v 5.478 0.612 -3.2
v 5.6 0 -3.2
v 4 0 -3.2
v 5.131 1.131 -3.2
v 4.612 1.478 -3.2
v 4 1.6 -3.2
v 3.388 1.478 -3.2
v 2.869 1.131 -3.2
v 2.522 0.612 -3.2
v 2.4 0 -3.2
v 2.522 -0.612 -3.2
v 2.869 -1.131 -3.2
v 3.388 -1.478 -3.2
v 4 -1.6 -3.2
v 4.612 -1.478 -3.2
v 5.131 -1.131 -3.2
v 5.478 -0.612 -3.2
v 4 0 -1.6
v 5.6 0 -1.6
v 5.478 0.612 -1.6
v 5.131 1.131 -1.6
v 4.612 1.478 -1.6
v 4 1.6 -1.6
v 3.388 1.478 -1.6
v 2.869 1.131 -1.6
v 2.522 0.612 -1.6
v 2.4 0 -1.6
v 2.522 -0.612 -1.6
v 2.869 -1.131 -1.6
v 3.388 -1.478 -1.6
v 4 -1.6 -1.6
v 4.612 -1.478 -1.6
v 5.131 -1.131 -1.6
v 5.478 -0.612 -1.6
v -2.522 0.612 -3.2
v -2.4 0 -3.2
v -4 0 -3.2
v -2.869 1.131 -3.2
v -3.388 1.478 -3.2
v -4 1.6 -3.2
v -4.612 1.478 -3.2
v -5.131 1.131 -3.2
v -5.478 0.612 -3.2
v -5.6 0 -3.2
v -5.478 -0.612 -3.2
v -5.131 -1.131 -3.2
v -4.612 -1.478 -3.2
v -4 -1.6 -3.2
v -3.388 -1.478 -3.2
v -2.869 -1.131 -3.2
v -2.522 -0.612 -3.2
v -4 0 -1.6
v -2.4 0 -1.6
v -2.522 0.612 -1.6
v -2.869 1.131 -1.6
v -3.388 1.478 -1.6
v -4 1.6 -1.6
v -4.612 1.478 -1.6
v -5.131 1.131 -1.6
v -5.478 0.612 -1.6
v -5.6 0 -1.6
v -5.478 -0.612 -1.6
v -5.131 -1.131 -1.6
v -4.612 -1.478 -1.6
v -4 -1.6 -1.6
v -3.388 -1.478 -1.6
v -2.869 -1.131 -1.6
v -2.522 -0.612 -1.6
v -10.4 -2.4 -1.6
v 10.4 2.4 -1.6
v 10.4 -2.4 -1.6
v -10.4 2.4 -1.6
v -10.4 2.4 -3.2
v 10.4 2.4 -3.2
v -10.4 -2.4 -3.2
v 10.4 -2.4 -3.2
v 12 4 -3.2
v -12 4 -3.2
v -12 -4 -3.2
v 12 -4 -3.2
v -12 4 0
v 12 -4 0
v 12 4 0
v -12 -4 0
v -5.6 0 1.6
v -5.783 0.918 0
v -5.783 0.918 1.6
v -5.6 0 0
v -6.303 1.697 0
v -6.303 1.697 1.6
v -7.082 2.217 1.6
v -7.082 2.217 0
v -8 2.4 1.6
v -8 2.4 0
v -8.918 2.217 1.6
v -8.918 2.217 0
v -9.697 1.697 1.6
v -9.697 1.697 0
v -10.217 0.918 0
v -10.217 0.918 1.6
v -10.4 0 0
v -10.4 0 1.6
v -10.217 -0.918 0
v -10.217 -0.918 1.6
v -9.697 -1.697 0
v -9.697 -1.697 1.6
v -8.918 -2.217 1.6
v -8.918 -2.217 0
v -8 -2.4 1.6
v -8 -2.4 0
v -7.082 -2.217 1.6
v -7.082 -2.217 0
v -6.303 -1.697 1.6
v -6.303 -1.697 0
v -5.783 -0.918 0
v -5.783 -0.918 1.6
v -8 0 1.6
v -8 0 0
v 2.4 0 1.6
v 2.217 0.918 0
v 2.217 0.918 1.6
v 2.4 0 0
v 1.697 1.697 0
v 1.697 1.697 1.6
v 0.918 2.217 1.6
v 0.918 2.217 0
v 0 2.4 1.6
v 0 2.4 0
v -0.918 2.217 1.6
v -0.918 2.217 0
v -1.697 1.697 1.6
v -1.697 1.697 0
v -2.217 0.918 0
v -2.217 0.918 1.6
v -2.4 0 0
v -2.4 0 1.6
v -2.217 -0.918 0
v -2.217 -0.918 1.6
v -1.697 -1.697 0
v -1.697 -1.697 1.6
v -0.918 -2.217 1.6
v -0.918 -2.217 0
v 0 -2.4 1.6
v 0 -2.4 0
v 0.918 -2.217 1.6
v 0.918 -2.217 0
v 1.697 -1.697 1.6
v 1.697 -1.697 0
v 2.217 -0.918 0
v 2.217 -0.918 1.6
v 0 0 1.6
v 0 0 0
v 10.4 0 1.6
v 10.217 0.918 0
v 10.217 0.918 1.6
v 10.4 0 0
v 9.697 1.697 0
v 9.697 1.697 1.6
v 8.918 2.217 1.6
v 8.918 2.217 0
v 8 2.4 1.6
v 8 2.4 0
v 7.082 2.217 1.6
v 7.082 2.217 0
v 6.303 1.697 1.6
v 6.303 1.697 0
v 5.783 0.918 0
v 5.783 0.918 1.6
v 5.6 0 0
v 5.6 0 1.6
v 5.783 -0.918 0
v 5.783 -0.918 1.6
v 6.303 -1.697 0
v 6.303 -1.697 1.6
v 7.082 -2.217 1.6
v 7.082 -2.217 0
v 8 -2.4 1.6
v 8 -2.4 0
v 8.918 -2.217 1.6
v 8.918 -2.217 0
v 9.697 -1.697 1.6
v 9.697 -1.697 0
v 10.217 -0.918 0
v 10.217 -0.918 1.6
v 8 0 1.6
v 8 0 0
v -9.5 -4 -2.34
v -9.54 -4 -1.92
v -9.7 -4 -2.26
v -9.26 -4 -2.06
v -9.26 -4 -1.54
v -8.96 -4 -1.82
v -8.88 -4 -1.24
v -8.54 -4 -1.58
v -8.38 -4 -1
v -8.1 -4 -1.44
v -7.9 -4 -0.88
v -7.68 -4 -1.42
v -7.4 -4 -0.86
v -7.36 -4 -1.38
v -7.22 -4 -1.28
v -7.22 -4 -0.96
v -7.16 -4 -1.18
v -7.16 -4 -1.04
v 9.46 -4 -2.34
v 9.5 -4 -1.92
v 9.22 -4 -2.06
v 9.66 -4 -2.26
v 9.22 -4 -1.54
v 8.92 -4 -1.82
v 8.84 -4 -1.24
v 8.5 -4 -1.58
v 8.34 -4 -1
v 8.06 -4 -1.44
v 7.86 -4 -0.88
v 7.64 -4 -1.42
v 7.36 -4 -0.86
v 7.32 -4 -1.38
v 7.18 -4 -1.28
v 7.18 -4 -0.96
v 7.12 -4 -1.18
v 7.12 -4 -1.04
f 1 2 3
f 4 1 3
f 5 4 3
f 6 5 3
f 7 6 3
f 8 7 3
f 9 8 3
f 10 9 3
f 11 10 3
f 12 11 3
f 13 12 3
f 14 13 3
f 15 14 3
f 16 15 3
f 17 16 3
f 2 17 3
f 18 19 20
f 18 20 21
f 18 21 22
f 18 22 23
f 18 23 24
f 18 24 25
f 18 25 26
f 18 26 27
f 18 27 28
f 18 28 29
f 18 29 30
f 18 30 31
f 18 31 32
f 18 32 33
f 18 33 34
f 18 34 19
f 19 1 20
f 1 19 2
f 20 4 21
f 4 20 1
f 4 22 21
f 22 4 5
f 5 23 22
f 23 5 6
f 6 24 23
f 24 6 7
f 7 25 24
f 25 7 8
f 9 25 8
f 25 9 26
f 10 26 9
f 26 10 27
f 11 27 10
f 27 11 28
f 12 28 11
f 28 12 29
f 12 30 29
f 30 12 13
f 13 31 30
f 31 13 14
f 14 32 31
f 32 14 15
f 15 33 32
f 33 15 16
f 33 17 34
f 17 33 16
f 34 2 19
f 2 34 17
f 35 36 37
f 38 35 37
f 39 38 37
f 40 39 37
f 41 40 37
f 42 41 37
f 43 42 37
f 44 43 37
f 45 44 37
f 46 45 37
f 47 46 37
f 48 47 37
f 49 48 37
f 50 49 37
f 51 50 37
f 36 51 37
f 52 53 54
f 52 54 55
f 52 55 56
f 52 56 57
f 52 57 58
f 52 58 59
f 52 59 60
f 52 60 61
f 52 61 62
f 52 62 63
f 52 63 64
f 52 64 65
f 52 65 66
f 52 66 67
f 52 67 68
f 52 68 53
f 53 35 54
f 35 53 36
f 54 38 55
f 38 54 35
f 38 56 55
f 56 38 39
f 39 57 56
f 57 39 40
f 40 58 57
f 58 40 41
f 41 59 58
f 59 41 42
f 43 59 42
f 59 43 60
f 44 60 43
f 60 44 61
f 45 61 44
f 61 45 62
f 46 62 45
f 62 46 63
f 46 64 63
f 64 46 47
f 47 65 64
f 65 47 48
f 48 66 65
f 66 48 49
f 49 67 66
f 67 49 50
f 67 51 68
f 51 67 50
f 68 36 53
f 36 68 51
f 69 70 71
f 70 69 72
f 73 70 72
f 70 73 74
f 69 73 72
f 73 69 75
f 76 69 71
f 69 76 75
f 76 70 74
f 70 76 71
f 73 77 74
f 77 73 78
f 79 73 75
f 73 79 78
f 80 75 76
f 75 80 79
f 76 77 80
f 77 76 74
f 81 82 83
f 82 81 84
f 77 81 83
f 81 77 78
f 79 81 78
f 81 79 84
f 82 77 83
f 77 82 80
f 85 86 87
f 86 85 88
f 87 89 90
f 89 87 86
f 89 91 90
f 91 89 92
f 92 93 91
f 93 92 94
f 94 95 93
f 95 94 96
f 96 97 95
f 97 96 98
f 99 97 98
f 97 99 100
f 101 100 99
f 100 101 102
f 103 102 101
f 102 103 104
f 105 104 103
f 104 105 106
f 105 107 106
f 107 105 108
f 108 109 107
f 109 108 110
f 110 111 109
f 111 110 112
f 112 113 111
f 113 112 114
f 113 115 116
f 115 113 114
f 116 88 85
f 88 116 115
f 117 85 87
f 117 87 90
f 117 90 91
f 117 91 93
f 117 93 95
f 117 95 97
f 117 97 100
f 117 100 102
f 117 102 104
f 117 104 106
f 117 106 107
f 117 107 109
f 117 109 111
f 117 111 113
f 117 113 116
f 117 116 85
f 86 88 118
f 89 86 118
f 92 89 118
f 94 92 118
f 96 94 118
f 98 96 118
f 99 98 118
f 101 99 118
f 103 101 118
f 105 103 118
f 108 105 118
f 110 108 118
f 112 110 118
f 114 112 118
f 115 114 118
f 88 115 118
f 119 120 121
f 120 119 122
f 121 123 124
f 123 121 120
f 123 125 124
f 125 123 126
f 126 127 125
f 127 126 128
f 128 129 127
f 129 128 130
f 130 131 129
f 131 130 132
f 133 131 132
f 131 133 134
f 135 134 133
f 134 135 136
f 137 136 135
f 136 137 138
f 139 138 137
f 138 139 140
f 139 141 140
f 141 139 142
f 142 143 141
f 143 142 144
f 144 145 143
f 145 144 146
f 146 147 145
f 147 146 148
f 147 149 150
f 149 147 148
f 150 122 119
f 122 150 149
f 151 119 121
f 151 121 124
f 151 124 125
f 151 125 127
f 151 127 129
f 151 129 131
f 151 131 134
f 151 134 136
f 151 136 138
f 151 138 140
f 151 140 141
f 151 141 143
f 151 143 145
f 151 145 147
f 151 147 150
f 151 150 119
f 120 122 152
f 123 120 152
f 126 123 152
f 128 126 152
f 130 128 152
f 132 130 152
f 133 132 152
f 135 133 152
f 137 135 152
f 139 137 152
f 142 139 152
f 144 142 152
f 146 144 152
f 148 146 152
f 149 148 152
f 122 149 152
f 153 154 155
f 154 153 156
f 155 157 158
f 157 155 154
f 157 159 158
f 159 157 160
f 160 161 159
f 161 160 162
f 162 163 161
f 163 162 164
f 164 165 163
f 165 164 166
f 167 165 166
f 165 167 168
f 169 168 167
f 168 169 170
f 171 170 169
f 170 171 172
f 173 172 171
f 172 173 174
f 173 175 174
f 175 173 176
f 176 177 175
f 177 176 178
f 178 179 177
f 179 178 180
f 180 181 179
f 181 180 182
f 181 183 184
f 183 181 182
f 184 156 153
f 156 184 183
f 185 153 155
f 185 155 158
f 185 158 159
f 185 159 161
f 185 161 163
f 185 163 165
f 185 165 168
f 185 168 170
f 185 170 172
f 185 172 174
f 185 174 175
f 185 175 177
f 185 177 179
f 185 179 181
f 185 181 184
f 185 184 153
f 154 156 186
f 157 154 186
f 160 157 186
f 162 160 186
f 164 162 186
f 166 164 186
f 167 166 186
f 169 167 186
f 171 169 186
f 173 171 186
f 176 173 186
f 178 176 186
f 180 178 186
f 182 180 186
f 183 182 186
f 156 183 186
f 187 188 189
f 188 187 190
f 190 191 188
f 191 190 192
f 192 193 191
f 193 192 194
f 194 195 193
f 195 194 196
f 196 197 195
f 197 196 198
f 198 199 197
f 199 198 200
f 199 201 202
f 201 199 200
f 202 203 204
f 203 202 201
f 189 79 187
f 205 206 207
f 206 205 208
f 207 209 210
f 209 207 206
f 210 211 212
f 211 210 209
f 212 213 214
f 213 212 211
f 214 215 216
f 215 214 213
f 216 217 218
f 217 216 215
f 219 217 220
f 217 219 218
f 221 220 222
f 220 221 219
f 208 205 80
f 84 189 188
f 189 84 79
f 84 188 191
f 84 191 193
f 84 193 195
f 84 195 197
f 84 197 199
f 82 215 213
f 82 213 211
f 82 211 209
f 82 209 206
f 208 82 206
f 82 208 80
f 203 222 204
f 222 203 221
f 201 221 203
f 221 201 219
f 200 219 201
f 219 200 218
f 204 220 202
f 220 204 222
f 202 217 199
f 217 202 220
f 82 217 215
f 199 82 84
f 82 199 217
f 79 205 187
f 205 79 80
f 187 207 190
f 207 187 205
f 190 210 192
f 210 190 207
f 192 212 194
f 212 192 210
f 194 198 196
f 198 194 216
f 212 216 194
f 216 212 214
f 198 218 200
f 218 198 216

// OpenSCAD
// file: ../p/stud.scad
use <../lib.scad>
use <4-4cyli.scad>
use <4-4disc.scad>
use <4-4edge.scad>
function ldraw_lib__stud() = [
// 0 Stud
// 0 Name: stud.dat
// 0 Author: James Jessiman
// 0 !LDRAW_ORG Primitive UPDATE 2012-01
// 0 !LICENSE Licensed under CC BY 4.0 : see CAreadme.txt
// 
// 0 BFC CERTIFY CCW
  [0,"BFC","CERTIFY"],
  [0,"BFC","CCW"],
// 
// 0 !HISTORY 2002-04-04 [sbliss] Modified for BFC compliance
// 0 !HISTORY 2002-04-25 [PTadmin] Official Update 2002-02
// 0 !HISTORY 2007-06-24 [PTadmin] Header formatted for Contributor Agreement
// 0 !HISTORY 2008-07-01 [PTadmin] Official Update 2008-01
// 0 !HISTORY 2012-02-16 [Philo] Changed to CCW
// 0 !HISTORY 2012-03-30 [PTadmin] Official Update 2012-01
// 
// 
// 1 16 0 0 0 6 0 0 0 1 0 0 0 6 4-4edge.dat
  [1,16,0,0,0,6,0,0,0,1,0,0,0,6, ldraw_lib__4_4edge()],
// 1 16 0 -4 0 6 0 0 0 1 0 0 0 6 4-4edge.dat
  [1,16,0,-4,0,6,0,0,0,1,0,0,0,6, ldraw_lib__4_4edge()],
// 1 16 0 0 0 6 0 0 0 -4 0 0 0 6 4-4cyli.dat
  [1,16,0,0,0,6,0,0,0,-4,0,0,0,6, ldraw_lib__4_4cyli()],
// 1 16 0 -4 0 6 0 0 0 1 0 0 0 6 4-4disc.dat
  [1,16,0,-4,0,6,0,0,0,1,0,0,0,6, ldraw_lib__4_4disc()],
  [-1,16,0,0,0,6,0,0,0,-1,0,0,0,6, ldraw_lib__4_4disc()],
];
module ldraw_lib__stud(step=0, col=false, unit=2/5, alt=false, line=0.2, solid=!$preview)
    makepoly(ldraw_lib__stud(), step=step, col=col, unit=unit, alt=alt, line=line, solid=solid);
ldraw_lib__stud(line=0.2);
// file: ../p/4-4edge.scad
use <../lib.scad>
function ldraw_lib__4_4edge() = [
// 0 Circle 1.0
// 0 Name: 4-4edge.dat
// 0 Author: James Jessiman
// 0 !LDRAW_ORG Primitive UPDATE 2017-01
// 0 !LICENSE Licensed under CC BY 2.0 and CC BY 4.0 : see CAreadme.txt
// 
// 0 BFC CERTIFY CCW
  [0,"BFC","CERTIFY"],
  [0,"BFC","CCW"],
// 
// 0 !HISTORY 1998-12-15 [PTadmin] Official Update 1998-10
// 0 !HISTORY 2005-12-28 [PTadmin] Official Update 2005-01
// 0 !HISTORY 2007-06-24 [PTadmin] Header formatted for Contributor Agreement
// 0 !HISTORY 2008-07-01 [PTadmin] Official Update 2008-01
// 0 !HISTORY 2017-01-15 [Steffen] BFCed
// 0 !HISTORY 2017-12-30 [PTadmin] Official Update 2017-01
// 
// 
// 2 24 1 0 0 0.9239 0 0.3827
  [2,24,1,0,0,0.9239,0,0.3827],
// 2 24 0.9239 0 0.3827 0.7071 0 0.7071
  [2,24,0.9239,0,0.3827,0.7071,0,0.7071],
// 2 24 0.7071 0 0.7071 0.3827 0 0.9239
  [2,24,0.7071,0,0.7071,0.3827,0,0.9239],
// 2 24 0.3827 0 0.9239 0 0 1
  [2,24,0.3827,0,0.9239,0,0,1],
// 2 24 0 0 1 -0.3827 0 0.9239
  [2,24,0,0,1,-0.3827,0,0.9239],
// 2 24 -0.3827 0 0.9239 -0.7071 0 0.7071
  [2,24,-0.3827,0,0.9239,-0.7071,0,0.7071],
// 2 24 -0.7071 0 0.7071 -0.9239 0 0.3827
  [2,24,-0.7071,0,0.7071,-0.9239,0,0.3827],
// 2 24 -0.9239 0 0.3827 -1 0 -0
  [2,24,-0.9239,0,0.3827,-1,0,-0],
// 2 24 -1 0 -0 -0.9239 0 -0.3827
  [2,24,-1,0,-0,-0.9239,0,-0.3827],
// 2 24 -0.9239 0 -0.3827 -0.7071 0 -0.7071
  [2,24,-0.9239,0,-0.3827,-0.7071,0,-0.7071],
// 2 24 -0.7071 0 -0.7071 -0.3827 0 -0.9239
  [2,24,-0.7071,0,-0.7071,-0.3827,0,-0.9239],
// 2 24 -0.3827 0 -0.9239 0 0 -1
  [2,24,-0.3827,0,-0.9239,0,0,-1],
// 2 24 0 0 -1 0.3827 0 -0.9239
  [2,24,0,0,-1,0.3827,0,-0.9239],
// 2 24 0.3827 0 -0.9239 0.7071 0 -0.7071
  [2,24,0.3827,0,-0.9239,0.7071,0,-0.7071],
// 2 24 0.7071 0 -0.7071 0.9239 0 -0.3827
  [2,24,0.7071,0,-0.7071,0.9239,0,-0.3827],
// 2 24 0.9239 0 -0.3827 1 0 0
  [2,24,0.9239,0,-0.3827,1,0,0],
];
module ldraw_lib__4_4edge(step=0, col=false, unit=2/5, alt=false, line=0.2, solid=!$preview)
    makepoly(ldraw_lib__4_4edge(), step=step, col=col, unit=unit, alt=alt, line=line, solid=solid);
ldraw_lib__4_4edge(line=0.2);
// file: ../p/4-4disc.scad
use <../lib.scad>
function ldraw_lib__4_4disc() = [
// 0 Disc 1.0
// 0 Name: 4-4disc.dat
// 0 Author: James Jessiman
// 0 !LDRAW_ORG Primitive UPDATE 2002-02
// 0 !LICENSE Licensed under CC BY 2.0 and CC BY 4.0 : see CAreadme.txt
// 
// 0 BFC CERTIFY CCW
  [0,"BFC","CERTIFY"],
  [0,"BFC","CCW"],
// 
// 0 !HISTORY 1998-12-15 [PTadmin] Official Update 1998-10
// 0 !HISTORY 2002-03-23 [sbliss] Added BFC statement
// 0 !HISTORY 2002-04-25 [PTadmin] Official Update 2002-02
// 0 !HISTORY 2007-06-24 [PTadmin] Header formatted for Contributor Agreement
// 0 !HISTORY 2008-07-01 [PTadmin] Official Update 2008-01
// 
// 
// 3 16 0 0 0 1 0 0 0.9239 0 0.3827
  [3,16,0,0,0,1,0,0,0.9239,0,0.3827],
// 3 16 0 0 0 0.9239 0 0.3827 0.7071 0 0.7071
  [3,16,0,0,0,0.9239,0,0.3827,0.7071,0,0.7071],
// 3 16 0 0 0 0.7071 0 0.7071 0.3827 0 0.9239
  [3,16,0,0,0,0.7071,0,0.7071,0.3827,0,0.9239],
// 3 16 0 0 0 0.3827 0 0.9239 0 0 1
  [3,16,0,0,0,0.3827,0,0.9239,0,0,1],
// 3 16 0 0 0 0 0 1 -0.3827 0 0.9239
  [3,16,0,0,0,0,0,1,-0.3827,0,0.9239],
// 3 16 0 0 0 -0.3827 0 0.9239 -0.7071 0 0.7071
  [3,16,0,0,0,-0.3827,0,0.9239,-0.7071,0,0.7071],
// 3 16 0 0 0 -0.7071 0 0.7071 -0.9239 0 0.3827
  [3,16,0,0,0,-0.7071,0,0.7071,-0.9239,0,0.3827],
// 3 16 0 0 0 -0.9239 0 0.3827 -1 0 -0
  [3,16,0,0,0,-0.9239,0,0.3827,-1,0,-0],
// 3 16 0 0 0 -1 0 -0 -0.9239 0 -0.3827
  [3,16,0,0,0,-1,0,-0,-0.9239,0,-0.3827],
// 3 16 0 0 0 -0.9239 0 -0.3827 -0.7071 0 -0.7071
  [3,16,0,0,0,-0.9239,0,-0.3827,-0.7071,0,-0.7071],
// 3 16 0 0 0 -0.7071 0 -0.7071 -0.3827 0 -0.9239
  [3,16,0,0,0,-0.7071,0,-0.7071,-0.3827,0,-0.9239],
// 3 16 0 0 0 -0.3827 0 -0.9239 0 0 -1
  [3,16,0,0,0,-0.3827,0,-0.9239,0,0,-1],
// 3 16 0 0 0 0 0 -1 0.3827 0 -0.9239
  [3,16,0,0,0,0,0,-1,0.3827,0,-0.9239],
// 3 16 0 0 0 0.3827 0 -0.9239 0.7071 0 -0.7071
  [3,16,0,0,0,0.3827,0,-0.9239,0.7071,0,-0.7071],
// 3 16 0 0 0 0.7071 0 -0.7071 0.9239 0 -0.3827
  [3,16,0,0,0,0.7071,0,-0.7071,0.9239,0,-0.3827],
// 3 16 0 0 0 0.9239 0 -0.3827 1 0 0
  [3,16,0,0,0,0.9239,0,-0.3827,1,0,0],
// 0
];
module ldraw_lib__4_4disc(step=0, col=false, unit=2/5, alt=false, line=0.2, solid=!$preview)
    makepoly(ldraw_lib__4_4disc(), step=step, col=col, unit=unit, alt=alt, line=line, solid=solid);
ldraw_lib__4_4disc(line=0.2);
// file: ../p/4-4cyli.scad
use <../lib.scad>
$fa=1; $fs=0.2;
function ldraw_lib__4_4cyli(realsolid=false) = [
// 0 Cylinder 1.0
// 0 Name: 4-4cyli.dat
// 0 Author: James Jessiman
// 0 !LDRAW_ORG Primitive UPDATE 2005-01
// 0 !LICENSE Licensed under CC BY 2.0 and CC BY 4.0 : see CAreadme.txt
// 
// 0 BFC CERTIFY CCW
  [0,"BFC","CERTIFY"],
  [0,"BFC","CCW"],
// 
// 0 !HISTORY 1998-12-15 [PTadmin] Official Update 1998-10
// 0 !HISTORY 2002-03-23 [sbliss] Added BFC statement; merged headers from files in distributions LDraw 0.27 and Complete.
// 0 !HISTORY 2002-04-25 [PTadmin] Official Update 2002-02
// 0 !HISTORY 2004-12-14 [guyvivan] BFC CCW
// 0 !HISTORY 2005-12-28 [PTadmin] Official Update 2005-01
// 0 !HISTORY 2007-06-24 [PTadmin] Header formatted for Contributor Agreement
// 0 !HISTORY 2008-07-01 [PTadmin] Official Update 2008-01
// 
// 
// 4 16 1 1 0 0.9239 1 0.3827 0.9239 0 0.3827 1 0 0
  [4,16,1,1,0,0.9239,1,0.3827,0.9239,0,0.3827,1,0,0],
// 5 24 1 0 0 1 1 0 0.9239 0 0.3827 0.9239 0 -0.3827
  [5,24,1,0,0,1,1,0,0.9239,0,0.3827,0.9239,0,-0.3827],
// 4 16 0.9239 1 0.3827 0.7071 1 0.7071 0.7071 0 0.7071 0.9239 0 0.3827
  [4,16,0.9239,1,0.3827,0.7071,1,0.7071,0.7071,0,0.7071,0.9239,0,0.3827],
// 5 24 0.9239 0 0.3827 0.9239 1 0.3827 0.7071 0 0.7071 1 0 0
  [5,24,0.9239,0,0.3827,0.9239,1,0.3827,0.7071,0,0.7071,1,0,0],
// 4 16 0.7071 1 0.7071 0.3827 1 0.9239 0.3827 0 0.9239 0.7071 0 0.7071
  [4,16,0.7071,1,0.7071,0.3827,1,0.9239,0.3827,0,0.9239,0.7071,0,0.7071],
// 5 24 0.7071 0 0.7071 0.7071 1 0.7071 0.3827 0 0.9239 0.9239 0 0.3827
  [5,24,0.7071,0,0.7071,0.7071,1,0.7071,0.3827,0,0.9239,0.9239,0,0.3827],
// 4 16 0.3827 1 0.9239 0 1 1 0 0 1 0.3827 0 0.9239
  [4,16,0.3827,1,0.9239,0,1,1,0,0,1,0.3827,0,0.9239],
// 5 24 0.3827 0 0.9239 0.3827 1 0.9239 0 0 1 0.7071 0 0.7071
  [5,24,0.3827,0,0.9239,0.3827,1,0.9239,0,0,1,0.7071,0,0.7071],
// 4 16 0 1 1 -0.3827 1 0.9239 -0.3827 0 0.9239 0 0 1
  [4,16,0,1,1,-0.3827,1,0.9239,-0.3827,0,0.9239,0,0,1],
// 5 24 0 0 1 0 1 1 -0.3827 0 0.9239 0.3827 0 0.9239
  [5,24,0,0,1,0,1,1,-0.3827,0,0.9239,0.3827,0,0.9239],
// 4 16 -0.3827 1 0.9239 -0.7071 1 0.7071 -0.7071 0 0.7071 -0.3827 0 0.9239
  [4,16,-0.3827,1,0.9239,-0.7071,1,0.7071,-0.7071,0,0.7071,-0.3827,0,0.9239],
// 5 24 -0.3827 0 0.9239 -0.3827 1 0.9239 -0.7071 0 0.7071 0 0 1
  [5,24,-0.3827,0,0.9239,-0.3827,1,0.9239,-0.7071,0,0.7071,0,0,1],
// 4 16 -0.7071 1 0.7071 -0.9239 1 0.3827 -0.9239 0 0.3827 -0.7071 0 0.7071
  [4,16,-0.7071,1,0.7071,-0.9239,1,0.3827,-0.9239,0,0.3827,-0.7071,0,0.7071],
// 5 24 -0.7071 0 0.7071 -0.7071 1 0.7071 -0.9239 0 0.3827 -0.3827 0 0.9239
  [5,24,-0.7071,0,0.7071,-0.7071,1,0.7071,-0.9239,0,0.3827,-0.3827,0,0.9239],
// 4 16 -0.9239 1 0.3827 -1 1 0 -1 0 0 -0.9239 0 0.3827
  [4,16,-0.9239,1,0.3827,-1,1,0,-1,0,0,-0.9239,0,0.3827],
// 5 24 -0.9239 0 0.3827 -0.9239 1 0.3827 -1 0 0 -0.7071 0 0.7071
  [5,24,-0.9239,0,0.3827,-0.9239,1,0.3827,-1,0,0,-0.7071,0,0.7071],
// 4 16 -1 1 0 -0.9239 1 -0.3827 -0.9239 0 -0.3827 -1 0 0
  [4,16,-1,1,0,-0.9239,1,-0.3827,-0.9239,0,-0.3827,-1,0,0],
// 5 24 -1 0 0 -1 1 0 -0.9239 0 -0.3827 -0.9239 0 0.3827
  [5,24,-1,0,0,-1,1,0,-0.9239,0,-0.3827,-0.9239,0,0.3827],
// 4 16 -0.9239 1 -0.3827 -0.7071 1 -0.7071 -0.7071 0 -0.7071 -0.9239 0 -0.3827
  [4,16,-0.9239,1,-0.3827,-0.7071,1,-0.7071,-0.7071,0,-0.7071,-0.9239,0,-0.3827],
// 5 24 -0.9239 0 -0.3827 -0.9239 1 -0.3827 -0.7071 0 -0.7071 -1 0 0
  [5,24,-0.9239,0,-0.3827,-0.9239,1,-0.3827,-0.7071,0,-0.7071,-1,0,0],
// 4 16 -0.7071 1 -0.7071 -0.3827 1 -0.9239 -0.3827 0 -0.9239 -0.7071 0 -0.7071
  [4,16,-0.7071,1,-0.7071,-0.3827,1,-0.9239,-0.3827,0,-0.9239,-0.7071,0,-0.7071],
// 5 24 -0.7071 0 -0.7071 -0.7071 1 -0.7071 -0.3827 0 -0.9239 -0.9239 0 -0.3827
  [5,24,-0.7071,0,-0.7071,-0.7071,1,-0.7071,-0.3827,0,-0.9239,-0.9239,0,-0.3827],
// 4 16 -0.3827 1 -0.9239 0 1 -1 0 0 -1 -0.3827 0 -0.9239
  [4,16,-0.3827,1,-0.9239,0,1,-1,0,0,-1,-0.3827,0,-0.9239],
// 5 24 -0.3827 0 -0.9239 -0.3827 1 -0.9239 0 0 -1 -0.7071 0 -0.7071
  [5,24,-0.3827,0,-0.9239,-0.3827,1,-0.9239,0,0,-1,-0.7071,0,-0.7071],
// 4 16 0 1 -1 0.3827 1 -0.9239 0.3827 0 -0.9239 0 0 -1
  [4,16,0,1,-1,0.3827,1,-0.9239,0.3827,0,-0.9239,0,0,-1],
// 5 24 0 0 -1 0 1 -1 0.3827 0 -0.9239 -0.3827 0 -0.9239
  [5,24,0,0,-1,0,1,-1,0.3827,0,-0.9239,-0.3827,0,-0.9239],
// 4 16 0.3827 1 -0.9239 0.7071 1 -0.7071 0.7071 0 -0.7071 0.3827 0 -0.9239
  [4,16,0.3827,1,-0.9239,0.7071,1,-0.7071,0.7071,0,-0.7071,0.3827,0,-0.9239],
// 5 24 0.3827 0 -0.9239 0.3827 1 -0.9239 0.7071 0 -0.7071 0 0 -1
  [5,24,0.3827,0,-0.9239,0.3827,1,-0.9239,0.7071,0,-0.7071,0,0,-1],
// 4 16 0.7071 1 -0.7071 0.9239 1 -0.3827 0.9239 0 -0.3827 0.7071 0 -0.7071
  [4,16,0.7071,1,-0.7071,0.9239,1,-0.3827,0.9239,0,-0.3827,0.7071,0,-0.7071],
// 5 24 0.7071 0 -0.7071 0.7071 1 -0.7071 0.9239 0 -0.3827 0.3827 0 -0.9239
  [5,24,0.7071,0,-0.7071,0.7071,1,-0.7071,0.9239,0,-0.3827,0.3827,0,-0.9239],
// 4 16 0.9239 1 -0.3827 1 1 0 1 0 0 0.9239 0 -0.3827
  [4,16,0.9239,1,-0.3827,1,1,0,1,0,0,0.9239,0,-0.3827],
// 5 24 0.9239 0 -0.3827 0.9239 1 -0.3827 1 0 0 0.7071 0 -0.7071
  [5,24,0.9239,0,-0.3827,0.9239,1,-0.3827,1,0,0,0.7071,0,-0.7071],
// 0
];
module ldraw_lib__4_4cyli(step=0, col=false, unit=2/5, alt=false, line=0.2, solid=!$preview)
    makepoly(ldraw_lib__4_4cyli(solid), step=step, col=col, unit=unit, alt=alt, line=line, solid=solid);
ldraw_lib__4_4cyli(line=0.2);
// file: ../p/stug-1x3.scad
use <../lib.scad>
use <stud.scad>
$fa=1; $fs=0.2;
function ldraw_lib__stug_1x3(realsolid=false) = [
// 0 Stud Group  1 x  3
// 0 Name: stug-1x3.dat
// 0 Author: Steffen [Steffen]
// 0 !LDRAW_ORG Primitive UPDATE 2012-01
// 0 !LICENSE Licensed under CC BY 2.0 and CC BY 4.0 : see CAreadme.txt
// 
// 0 BFC CERTIFY CCW
  [0,"BFC","CERTIFY"],
  [0,"BFC","CCW"],
// 
// 0 !HISTORY 2012-03-30 [PTadmin] Official Update 2012-01
// 
// 
// 1 16 -20 0 0 1 0 0 0 1 0 0 0 1 stud.dat
  [1,16,-20,0,0,1,0,0,0,1,0,0,0,1, ldraw_lib__stud(realsolid)],
// 1 16 0 0 0 1 0 0 0 1 0 0 0 1 stud.dat
  [1,16,0,0,0,1,0,0,0,1,0,0,0,1, ldraw_lib__stud(realsolid)],
// 1 16 20 0 0 1 0 0 0 1 0 0 0 1 stud.dat
  [1,16,20,0,0,1,0,0,0,1,0,0,0,1, ldraw_lib__stud(realsolid)],
];
module ldraw_lib__stug_1x3(step=0, col=false, unit=2/5, alt=false, line=0.2, solid=!$preview)
    makepoly(ldraw_lib__stug_1x3(solid), step=step, col=col, unit=unit, alt=alt, line=line, solid=solid);
ldraw_lib__stug_1x3(line=0.2);
// file: ../p/stud3.scad
use <../lib.scad>
use <4-4cyli.scad>
use <4-4disc.scad>
use <4-4edge.scad>
function ldraw_lib__stud3() = [
// 0 Stud Tube Solid
// 0 Name: stud3.dat
// 0 Author: James Jessiman
// 0 !LDRAW_ORG Primitive UPDATE 2012-01
// 0 !LICENSE Licensed under CC BY 4.0 : see CAreadme.txt
// 
// 0 BFC CERTIFY CCW
  [0,"BFC","CERTIFY"],
  [0,"BFC","CCW"],
// 
// 0 !HISTORY 2002-04-04 [sbliss] Modified for BFC compliance
// 0 !HISTORY 2002-04-25 [PTadmin] Official Update 2002-02
// 0 !HISTORY 2007-06-24 [PTadmin] Header formatted for Contributor Agreement
// 0 !HISTORY 2008-07-01 [PTadmin] Official Update 2008-01
// 0 !HISTORY 2012-02-16 [Philo] Changed to CCW
// 0 !HISTORY 2012-03-30 [PTadmin] Official Update 2012-01
// 
// 
// 1 16 0 -4 0 4 0 0 0 1 0 0 0 4 4-4edge.dat
  [1,16,0,-4,0,4,0,0,0,1,0,0,0,4, ldraw_lib__4_4edge()],
// 1 16 0 0 0 4 0 0 0 1 0 0 0 4 4-4edge.dat
  [1,16,0,0,0,4,0,0,0,1,0,0,0,4, ldraw_lib__4_4edge()],
// 1 16 0 -4 0 4 0 0 0 1 0 0 0 4 4-4disc.dat
  [1,16,0,-4,0,4,0,0,0,1,0,0,0,4, ldraw_lib__4_4disc()],
  [-1,16,0,0,0,4,0,0,0,-1,0,0,0,4, ldraw_lib__4_4disc()],
// 1 16 0 -4 0 4 0 0 0 4 0 0 0 4 4-4cyli.dat
  [1,16,0,-4,0,4,0,0,0,4,0,0,0,4, ldraw_lib__4_4cyli()],
];
module ldraw_lib__stud3(step=0, col=false, unit=2/5, alt=false, line=0.2, solid=!$preview)
    makepoly(ldraw_lib__stud3(), step=step, col=col, unit=unit, alt=alt, line=line, solid=solid);
ldraw_lib__stud3(line=0.2);
// file: ../p/box5.scad
use <../lib.scad>
function ldraw_lib__box5() = [
// 0 Box with 5 Faces and All Edges
// 0 Name: box5.dat
// 0 Author: James Jessiman
// 0 !LDRAW_ORG Primitive UPDATE 2012-01
// 0 !LICENSE Licensed under CC BY 2.0 and CC BY 4.0 : see CAreadme.txt
// 
// 0 BFC CERTIFY CCW
  [0,"BFC","CERTIFY"],
  [0,"BFC","CCW"],
// 
// 0 !HISTORY 2002-04-03 [sbliss] Modified for BFC compliance
// 0 !HISTORY 2002-04-25 [PTadmin] Official Update 2002-02
// 0 !HISTORY 2007-06-24 [PTadmin] Header formatted for Contributor Agreement
// 0 !HISTORY 2008-07-01 [PTadmin] Official Update 2008-01
// 0 !HISTORY 2012-02-16 [Philo] Changed to CCW
// 0 !HISTORY 2012-03-30 [PTadmin] Official Update 2012-01
// 
// 
// 2 24 1 1 1 -1 1 1
  [2,24,1,1,1,-1,1,1],
// 2 24 -1 1 1 -1 1 -1
  [2,24,-1,1,1,-1,1,-1],
// 2 24 -1 1 -1 1 1 -1
  [2,24,-1,1,-1,1,1,-1],
// 2 24 1 1 -1 1 1 1
  [2,24,1,1,-1,1,1,1],
// 2 24 1 0 1 -1 0 1
  [2,24,1,0,1,-1,0,1],
// 2 24 -1 0 1 -1 0 -1
  [2,24,-1,0,1,-1,0,-1],
// 2 24 -1 0 -1 1 0 -1
  [2,24,-1,0,-1,1,0,-1],
// 2 24 1 0 -1 1 0 1
  [2,24,1,0,-1,1,0,1],
// 2 24 1 0 1 1 1 1
  [2,24,1,0,1,1,1,1],
// 2 24 -1 0 1 -1 1 1
  [2,24,-1,0,1,-1,1,1],
// 2 24 1 0 -1 1 1 -1
  [2,24,1,0,-1,1,1,-1],
// 2 24 -1 0 -1 -1 1 -1
  [2,24,-1,0,-1,-1,1,-1],
// 4 16 -1 1 1 1 1 1 1 1 -1 -1 1 -1
  [4,16,-1,1,1,1,1,1,1,1,-1,-1,1,-1],
// 4 16 -1 1 1 -1 0 1 1 0 1 1 1 1
  [4,16,-1,1,1,-1,0,1,1,0,1,1,1,1],
// 4 16 -1 1 -1 -1 0 -1 -1 0 1 -1 1 1
  [4,16,-1,1,-1,-1,0,-1,-1,0,1,-1,1,1],
// 4 16 1 1 -1 1 0 -1 -1 0 -1 -1 1 -1
  [4,16,1,1,-1,1,0,-1,-1,0,-1,-1,1,-1],
// 4 16 1 1 1 1 0 1 1 0 -1 1 1 -1
  [4,16,1,1,1,1,0,1,1,0,-1,1,1,-1],
];
makepoly(ldraw_lib__box5(), line=0.2);
// file: ../p/box4t.scad
use <../lib.scad>
function ldraw_lib__box4t() = [
// 0 Box with 4 Adjacent Faces and All Edges
// 0 Name: box4t.dat
// 0 Author: Tore Eriksson [Tore_Eriksson]
// 0 !LDRAW_ORG Primitive UPDATE 2003-02
// 0 !LICENSE Licensed under CC BY 2.0 and CC BY 4.0 : see CAreadme.txt
// 
// 0 BFC CERTIFY CCW
  [0,"BFC","CERTIFY"],
  [0,"BFC","CCW"],
// 
// 0 !HISTORY 1997-09-29 [PTadmin] Official Update 1997-15
// 0 !HISTORY 2002-08-31 [izanette] Modified with WINDZ for BFC compliance
// 0 !HISTORY 2003-08-01 [PTadmin] Official Update 2003-02
// 0 !HISTORY 2007-06-24 [PTadmin] Header formatted for Contributor Agreement
// 0 !HISTORY 2008-07-01 [PTadmin] Official Update 2008-01
// 
// 
// 2 24 1 1 1 -1 1 1
  [2,24,1,1,1,-1,1,1],
// 2 24 -1 1 1 -1 1 -1
  [2,24,-1,1,1,-1,1,-1],
// 2 24 -1 1 -1 1 1 -1
  [2,24,-1,1,-1,1,1,-1],
// 2 24 1 1 -1 1 1 1
  [2,24,1,1,-1,1,1,1],
// 2 24 1 0 1 -1 0 1
  [2,24,1,0,1,-1,0,1],
// 2 24 -1 0 1 -1 0 -1
  [2,24,-1,0,1,-1,0,-1],
// 2 24 -1 0 -1 1 0 -1
  [2,24,-1,0,-1,1,0,-1],
// 2 24 1 0 -1 1 0 1
  [2,24,1,0,-1,1,0,1],
// 2 24 1 0 1 1 1 1
  [2,24,1,0,1,1,1,1],
// 2 24 -1 0 1 -1 1 1
  [2,24,-1,0,1,-1,1,1],
// 2 24 1 0 -1 1 1 -1
  [2,24,1,0,-1,1,1,-1],
// 2 24 -1 0 -1 -1 1 -1
  [2,24,-1,0,-1,-1,1,-1],
// 4 16 1 1 1 1 1 -1 -1 1 -1 -1 1 1
  [4,16,1,1,1,1,1,-1,-1,1,-1,-1,1,1],
// 4 16 1 1 1 -1 1 1 -1 0 1 1 0 1
  [4,16,1,1,1,-1,1,1,-1,0,1,1,0,1],
// 4 16 -1 1 1 -1 1 -1 -1 0 -1 -1 0 1
  [4,16,-1,1,1,-1,1,-1,-1,0,-1,-1,0,1],
// 0 4 16 -1 1 -1 -1 0 -1 1 0 -1 1 1 -1
// 4 16 1 1 -1 1 1 1 1 0 1 1 0 -1
  [4,16,1,1,-1,1,1,1,1,0,1,1,0,-1],
// 0
];
makepoly(ldraw_lib__box4t(), line=0.2);
// file: s/3623s01.scad
use <../../lib.scad>
use <../../p/box4t.scad>
use <../../p/box5.scad>
use <../../p/stud3.scad>
use <../../p/stug-1x3.scad>
function ldraw_lib__s__3623s01() = [
// 0 ~Plate  1 x  3 without Front Face
// 0 Name: s\3623s01.dat
// 0 Author: Massimo Maso [Sirio]
// 0 !LDRAW_ORG Subpart UPDATE 2017-01
// 0 !LICENSE Licensed under CC BY 2.0 and CC BY 4.0 : see CAreadme.txt
// 
// 0 BFC CERTIFY CCW
  [0,"BFC","CERTIFY"],
  [0,"BFC","CCW"],
// 
// 0 !HISTORY 2017-12-30 [PTadmin] Official Update 2017-01
// 
// 
// 1 16 10 4 0 1 0 0 0 -1 0 0 0 1 stud3.dat
  [1,16,10,4,0,1,0,0,0,-1,0,0,0,1, ldraw_lib__stud3()],
// 1 16 -10 4 0 1 0 0 0 -1 0 0 0 1 stud3.dat
  [1,16,-10,4,0,1,0,0,0,-1,0,0,0,1, ldraw_lib__stud3()],
// 0 BFC INVERTNEXT
  [0,"BFC","INVERTNEXT"],
// 1 16 0 8 0 26 0 0 0 -4 0 0 0 6 box5.dat
  [1,16,0,8,0,26,0,0,0,-4,0,0,0,6, ldraw_lib__box5()],
// 4 16 30 8 10 26 8 6 -26 8 6 -30 8 10
  [4,16,30,8,10,26,8,6,-26,8,6,-30,8,10],
// 4 16 -30 8 10 -26 8 6 -26 8 -6 -30 8 -10
  [4,16,-30,8,10,-26,8,6,-26,8,-6,-30,8,-10],
// 4 16 -30 8 -10 -26 8 -6 26 8 -6 30 8 -10
  [4,16,-30,8,-10,-26,8,-6,26,8,-6,30,8,-10],
// 4 16 30 8 -10 26 8 -6 26 8 6 30 8 10
  [4,16,30,8,-10,26,8,-6,26,8,6,30,8,10],
// 1 16 0 8 0 30 0 0 0 -8 0 0 0 10 box4t.dat
  [1,16,0,8,0,30,0,0,0,-8,0,0,0,10, ldraw_lib__box4t()],
// 1 16 0 0 0 1 0 0 0 1 0 0 0 1 stug-1x3.dat
  [1,16,0,0,0,1,0,0,0,1,0,0,0,1, ldraw_lib__stug_1x3()],
];
module ldraw_lib__s__3623s01(step=0, col=false, unit=2/5, alt=false, line=0.2, solid=!$preview)
    makepoly(ldraw_lib__s__3623s01(), step=step, col=col, unit=unit, alt=alt, line=line, solid=solid);
ldraw_lib__s__3623s01(line=0.2);
// main file
use <../lib.scad>
use <s/3623s01.scad>
function ldraw_lib__3623p02() = [
// 0 Plate  1 x  3 with Symmetric, High Set Black Eyebrows Pattern
// 0 Name: 3623p02.dat
// 0 Author: Evert-Jan Boer [ejboer]
// 0 !LDRAW_ORG Part UPDATE 2022-01
// 0 !LICENSE Licensed under CC BY 4.0 : see CAreadme.txt
// 
// 0 BFC CERTIFY CCW
  [0,"BFC","CERTIFY"],
  [0,"BFC","CCW"],
// 
// 0 !KEYWORDS Bricklink 3623pb006, Rebrickable 3623pr0011, Set 71231, Unikitty
// 
// 0 !HISTORY 2022-01-14 [PTadmin] Official Update 2022-01
// 
// 
// 1 16 0 0 0 1 0 0 0 1 0 0 0 1 s\3623s01.dat
  [1,16,0,0,0,1,0,0,0,1,0,0,0,1, ldraw_lib__s__3623s01()],
// 
// 4 0 -23.15 5.15 -10 -23.85 4.8 -10 -24.25 5.65 -10 -23.75 5.85 -10
  [4,0,-23.15,5.15,-10,-23.85,4.8,-10,-24.25,5.65,-10,-23.75,5.85,-10],
// 4 0 -23.85 4.8 -10 -23.15 5.15 -10 -22.4 4.55 -10 -23.15 3.85 -10
  [4,0,-23.85,4.8,-10,-23.15,5.15,-10,-22.4,4.55,-10,-23.15,3.85,-10],
// 4 0 -23.15 3.85 -10 -22.4 4.55 -10 -21.35 3.95 -10 -22.2 3.1 -10
  [4,0,-23.15,3.85,-10,-22.4,4.55,-10,-21.35,3.95,-10,-22.2,3.1,-10],
// 4 0 -22.2 3.1 -10 -21.35 3.95 -10 -20.25 3.6 -10 -20.95 2.5 -10
  [4,0,-22.2,3.1,-10,-21.35,3.95,-10,-20.25,3.6,-10,-20.95,2.5,-10],
// 4 0 -20.95 2.5 -10 -20.25 3.6 -10 -19.2 3.55 -10 -19.75 2.2 -10
  [4,0,-20.95,2.5,-10,-20.25,3.6,-10,-19.2,3.55,-10,-19.75,2.2,-10],
// 4 0 -18.4 3.45 -10 -18.5 2.15 -10 -19.75 2.2 -10 -19.2 3.55 -10
  [4,0,-18.4,3.45,-10,-18.5,2.15,-10,-19.75,2.2,-10,-19.2,3.55,-10],
// 4 0 -18.05 3.2 -10 -18.05 2.4 -10 -18.5 2.15 -10 -18.4 3.45 -10
  [4,0,-18.05,3.2,-10,-18.05,2.4,-10,-18.5,2.15,-10,-18.4,3.45,-10],
// 4 0 -18.05 3.2 -10 -17.9 2.95 -10 -17.9 2.6 -10 -18.05 2.4 -10
  [4,0,-18.05,3.2,-10,-17.9,2.95,-10,-17.9,2.6,-10,-18.05,2.4,-10],
// 3 16 -24.25 5.65 -10 -30 8 -10 -23.75 5.85 -10
  [3,16,-24.25,5.65,-10,-30,8,-10,-23.75,5.85,-10],
// 4 0 24.15 5.65 -10 23.75 4.8 -10 23.05 5.15 -10 23.65 5.85 -10
  [4,0,24.15,5.65,-10,23.75,4.8,-10,23.05,5.15,-10,23.65,5.85,-10],
// 4 0 22.3 4.55 -10 23.05 5.15 -10 23.75 4.8 -10 23.05 3.85 -10
  [4,0,22.3,4.55,-10,23.05,5.15,-10,23.75,4.8,-10,23.05,3.85,-10],
// 4 0 23.05 3.85 -10 22.1 3.1 -10 21.25 3.95 -10 22.3 4.55 -10
  [4,0,23.05,3.85,-10,22.1,3.1,-10,21.25,3.95,-10,22.3,4.55,-10],
// 4 0 20.15 3.6 -10 21.25 3.95 -10 22.1 3.1 -10 20.85 2.5 -10
  [4,0,20.15,3.6,-10,21.25,3.95,-10,22.1,3.1,-10,20.85,2.5,-10],
// 4 0 20.85 2.5 -10 19.65 2.2 -10 19.1 3.55 -10 20.15 3.6 -10
  [4,0,20.85,2.5,-10,19.65,2.2,-10,19.1,3.55,-10,20.15,3.6,-10],
// 4 0 19.65 2.2 -10 18.4 2.15 -10 18.3 3.45 -10 19.1 3.55 -10
  [4,0,19.65,2.2,-10,18.4,2.15,-10,18.3,3.45,-10,19.1,3.55,-10],
// 4 0 17.95 3.2 -10 18.3 3.45 -10 18.4 2.15 -10 17.95 2.4 -10
  [4,0,17.95,3.2,-10,18.3,3.45,-10,18.4,2.15,-10,17.95,2.4,-10],
// 4 0 17.8 2.6 -10 17.8 2.95 -10 17.95 3.2 -10 17.95 2.4 -10
  [4,0,17.8,2.6,-10,17.8,2.95,-10,17.95,3.2,-10,17.95,2.4,-10],
// 3 16 24.15 5.65 -10 23.65 5.85 -10 30 8 -10
  [3,16,24.15,5.65,-10,23.65,5.85,-10,30,8,-10],
// 4 16 -23.85 4.8 -10 -30 0 -10 -30 8 -10 -24.25 5.65 -10
  [4,16,-23.85,4.8,-10,-30,0,-10,-30,8,-10,-24.25,5.65,-10],
// 3 16 -30 0 -10 -23.85 4.8 -10 -23.15 3.85 -10
  [3,16,-30,0,-10,-23.85,4.8,-10,-23.15,3.85,-10],
// 3 16 -30 0 -10 -23.15 3.85 -10 -22.2 3.1 -10
  [3,16,-30,0,-10,-23.15,3.85,-10,-22.2,3.1,-10],
// 3 16 -30 0 -10 -22.2 3.1 -10 -20.95 2.5 -10
  [3,16,-30,0,-10,-22.2,3.1,-10,-20.95,2.5,-10],
// 3 16 -30 0 -10 -20.95 2.5 -10 -19.75 2.2 -10
  [3,16,-30,0,-10,-20.95,2.5,-10,-19.75,2.2,-10],
// 3 16 -30 0 -10 -19.75 2.2 -10 -18.5 2.15 -10
  [3,16,-30,0,-10,-19.75,2.2,-10,-18.5,2.15,-10],
// 3 16 30 0 -10 19.65 2.2 -10 20.85 2.5 -10
  [3,16,30,0,-10,19.65,2.2,-10,20.85,2.5,-10],
// 3 16 30 0 -10 20.85 2.5 -10 22.1 3.1 -10
  [3,16,30,0,-10,20.85,2.5,-10,22.1,3.1,-10],
// 3 16 30 0 -10 22.1 3.1 -10 23.05 3.85 -10
  [3,16,30,0,-10,22.1,3.1,-10,23.05,3.85,-10],
// 3 16 30 0 -10 23.05 3.85 -10 23.75 4.8 -10
  [3,16,30,0,-10,23.05,3.85,-10,23.75,4.8,-10],
// 4 16 23.75 4.8 -10 24.15 5.65 -10 30 8 -10 30 0 -10
  [4,16,23.75,4.8,-10,24.15,5.65,-10,30,8,-10,30,0,-10],
// 4 16 17.8 2.95 -10 17.8 2.6 -10 -17.9 2.6 -10 -17.9 2.95 -10
  [4,16,17.8,2.95,-10,17.8,2.6,-10,-17.9,2.6,-10,-17.9,2.95,-10],
// 4 16 -17.9 2.95 -10 -18.05 3.2 -10 17.95 3.2 -10 17.8 2.95 -10
  [4,16,-17.9,2.95,-10,-18.05,3.2,-10,17.95,3.2,-10,17.8,2.95,-10],
// 4 16 18.3 3.45 -10 17.95 3.2 -10 -18.05 3.2 -10 -18.4 3.45 -10
  [4,16,18.3,3.45,-10,17.95,3.2,-10,-18.05,3.2,-10,-18.4,3.45,-10],
// 4 16 -17.9 2.6 -10 17.8 2.6 -10 17.95 2.4 -10 -18.05 2.4 -10
  [4,16,-17.9,2.6,-10,17.8,2.6,-10,17.95,2.4,-10,-18.05,2.4,-10],
// 4 16 18.4 2.15 -10 -18.5 2.15 -10 -18.05 2.4 -10 17.95 2.4 -10
  [4,16,18.4,2.15,-10,-18.5,2.15,-10,-18.05,2.4,-10,17.95,2.4,-10],
// 3 16 30 0 -10 18.4 2.15 -10 19.65 2.2 -10
  [3,16,30,0,-10,18.4,2.15,-10,19.65,2.2,-10],
// 4 16 -18.5 2.15 -10 18.4 2.15 -10 30 0 -10 -30 0 -10
  [4,16,-18.5,2.15,-10,18.4,2.15,-10,30,0,-10,-30,0,-10],
// 4 16 -23.75 5.85 -10 -30 8 -10 30 8 -10 23.65 5.85 -10
  [4,16,-23.75,5.85,-10,-30,8,-10,30,8,-10,23.65,5.85,-10],
// 4 16 -23.75 5.85 -10 23.65 5.85 -10 23.05 5.15 -10 -23.15 5.15 -10
  [4,16,-23.75,5.85,-10,23.65,5.85,-10,23.05,5.15,-10,-23.15,5.15,-10],
// 4 16 22.3 4.55 -10 -22.4 4.55 -10 -23.15 5.15 -10 23.05 5.15 -10
  [4,16,22.3,4.55,-10,-22.4,4.55,-10,-23.15,5.15,-10,23.05,5.15,-10],
// 4 16 22.3 4.55 -10 21.25 3.95 -10 -21.35 3.95 -10 -22.4 4.55 -10
  [4,16,22.3,4.55,-10,21.25,3.95,-10,-21.35,3.95,-10,-22.4,4.55,-10],
// 4 16 19.1 3.55 -10 -19.2 3.55 -10 -20.25 3.6 -10 -21.35 3.95 -10
  [4,16,19.1,3.55,-10,-19.2,3.55,-10,-20.25,3.6,-10,-21.35,3.95,-10],
// 4 16 -21.35 3.95 -10 21.25 3.95 -10 20.15 3.6 -10 19.1 3.55 -10
  [4,16,-21.35,3.95,-10,21.25,3.95,-10,20.15,3.6,-10,19.1,3.55,-10],
// 4 16 19.1 3.55 -10 18.3 3.45 -10 -18.4 3.45 -10 -19.2 3.55 -10
  [4,16,19.1,3.55,-10,18.3,3.45,-10,-18.4,3.45,-10,-19.2,3.55,-10],
];
module ldraw_lib__3623p02(step=0, col=false, unit=2/5, alt=false, line=0.2, solid=!$preview)
    makepoly(ldraw_lib__3623p02(), step=step, col=col, unit=unit, alt=alt, line=line, solid=solid);
ldraw_lib__3623p02(line=0.2);
